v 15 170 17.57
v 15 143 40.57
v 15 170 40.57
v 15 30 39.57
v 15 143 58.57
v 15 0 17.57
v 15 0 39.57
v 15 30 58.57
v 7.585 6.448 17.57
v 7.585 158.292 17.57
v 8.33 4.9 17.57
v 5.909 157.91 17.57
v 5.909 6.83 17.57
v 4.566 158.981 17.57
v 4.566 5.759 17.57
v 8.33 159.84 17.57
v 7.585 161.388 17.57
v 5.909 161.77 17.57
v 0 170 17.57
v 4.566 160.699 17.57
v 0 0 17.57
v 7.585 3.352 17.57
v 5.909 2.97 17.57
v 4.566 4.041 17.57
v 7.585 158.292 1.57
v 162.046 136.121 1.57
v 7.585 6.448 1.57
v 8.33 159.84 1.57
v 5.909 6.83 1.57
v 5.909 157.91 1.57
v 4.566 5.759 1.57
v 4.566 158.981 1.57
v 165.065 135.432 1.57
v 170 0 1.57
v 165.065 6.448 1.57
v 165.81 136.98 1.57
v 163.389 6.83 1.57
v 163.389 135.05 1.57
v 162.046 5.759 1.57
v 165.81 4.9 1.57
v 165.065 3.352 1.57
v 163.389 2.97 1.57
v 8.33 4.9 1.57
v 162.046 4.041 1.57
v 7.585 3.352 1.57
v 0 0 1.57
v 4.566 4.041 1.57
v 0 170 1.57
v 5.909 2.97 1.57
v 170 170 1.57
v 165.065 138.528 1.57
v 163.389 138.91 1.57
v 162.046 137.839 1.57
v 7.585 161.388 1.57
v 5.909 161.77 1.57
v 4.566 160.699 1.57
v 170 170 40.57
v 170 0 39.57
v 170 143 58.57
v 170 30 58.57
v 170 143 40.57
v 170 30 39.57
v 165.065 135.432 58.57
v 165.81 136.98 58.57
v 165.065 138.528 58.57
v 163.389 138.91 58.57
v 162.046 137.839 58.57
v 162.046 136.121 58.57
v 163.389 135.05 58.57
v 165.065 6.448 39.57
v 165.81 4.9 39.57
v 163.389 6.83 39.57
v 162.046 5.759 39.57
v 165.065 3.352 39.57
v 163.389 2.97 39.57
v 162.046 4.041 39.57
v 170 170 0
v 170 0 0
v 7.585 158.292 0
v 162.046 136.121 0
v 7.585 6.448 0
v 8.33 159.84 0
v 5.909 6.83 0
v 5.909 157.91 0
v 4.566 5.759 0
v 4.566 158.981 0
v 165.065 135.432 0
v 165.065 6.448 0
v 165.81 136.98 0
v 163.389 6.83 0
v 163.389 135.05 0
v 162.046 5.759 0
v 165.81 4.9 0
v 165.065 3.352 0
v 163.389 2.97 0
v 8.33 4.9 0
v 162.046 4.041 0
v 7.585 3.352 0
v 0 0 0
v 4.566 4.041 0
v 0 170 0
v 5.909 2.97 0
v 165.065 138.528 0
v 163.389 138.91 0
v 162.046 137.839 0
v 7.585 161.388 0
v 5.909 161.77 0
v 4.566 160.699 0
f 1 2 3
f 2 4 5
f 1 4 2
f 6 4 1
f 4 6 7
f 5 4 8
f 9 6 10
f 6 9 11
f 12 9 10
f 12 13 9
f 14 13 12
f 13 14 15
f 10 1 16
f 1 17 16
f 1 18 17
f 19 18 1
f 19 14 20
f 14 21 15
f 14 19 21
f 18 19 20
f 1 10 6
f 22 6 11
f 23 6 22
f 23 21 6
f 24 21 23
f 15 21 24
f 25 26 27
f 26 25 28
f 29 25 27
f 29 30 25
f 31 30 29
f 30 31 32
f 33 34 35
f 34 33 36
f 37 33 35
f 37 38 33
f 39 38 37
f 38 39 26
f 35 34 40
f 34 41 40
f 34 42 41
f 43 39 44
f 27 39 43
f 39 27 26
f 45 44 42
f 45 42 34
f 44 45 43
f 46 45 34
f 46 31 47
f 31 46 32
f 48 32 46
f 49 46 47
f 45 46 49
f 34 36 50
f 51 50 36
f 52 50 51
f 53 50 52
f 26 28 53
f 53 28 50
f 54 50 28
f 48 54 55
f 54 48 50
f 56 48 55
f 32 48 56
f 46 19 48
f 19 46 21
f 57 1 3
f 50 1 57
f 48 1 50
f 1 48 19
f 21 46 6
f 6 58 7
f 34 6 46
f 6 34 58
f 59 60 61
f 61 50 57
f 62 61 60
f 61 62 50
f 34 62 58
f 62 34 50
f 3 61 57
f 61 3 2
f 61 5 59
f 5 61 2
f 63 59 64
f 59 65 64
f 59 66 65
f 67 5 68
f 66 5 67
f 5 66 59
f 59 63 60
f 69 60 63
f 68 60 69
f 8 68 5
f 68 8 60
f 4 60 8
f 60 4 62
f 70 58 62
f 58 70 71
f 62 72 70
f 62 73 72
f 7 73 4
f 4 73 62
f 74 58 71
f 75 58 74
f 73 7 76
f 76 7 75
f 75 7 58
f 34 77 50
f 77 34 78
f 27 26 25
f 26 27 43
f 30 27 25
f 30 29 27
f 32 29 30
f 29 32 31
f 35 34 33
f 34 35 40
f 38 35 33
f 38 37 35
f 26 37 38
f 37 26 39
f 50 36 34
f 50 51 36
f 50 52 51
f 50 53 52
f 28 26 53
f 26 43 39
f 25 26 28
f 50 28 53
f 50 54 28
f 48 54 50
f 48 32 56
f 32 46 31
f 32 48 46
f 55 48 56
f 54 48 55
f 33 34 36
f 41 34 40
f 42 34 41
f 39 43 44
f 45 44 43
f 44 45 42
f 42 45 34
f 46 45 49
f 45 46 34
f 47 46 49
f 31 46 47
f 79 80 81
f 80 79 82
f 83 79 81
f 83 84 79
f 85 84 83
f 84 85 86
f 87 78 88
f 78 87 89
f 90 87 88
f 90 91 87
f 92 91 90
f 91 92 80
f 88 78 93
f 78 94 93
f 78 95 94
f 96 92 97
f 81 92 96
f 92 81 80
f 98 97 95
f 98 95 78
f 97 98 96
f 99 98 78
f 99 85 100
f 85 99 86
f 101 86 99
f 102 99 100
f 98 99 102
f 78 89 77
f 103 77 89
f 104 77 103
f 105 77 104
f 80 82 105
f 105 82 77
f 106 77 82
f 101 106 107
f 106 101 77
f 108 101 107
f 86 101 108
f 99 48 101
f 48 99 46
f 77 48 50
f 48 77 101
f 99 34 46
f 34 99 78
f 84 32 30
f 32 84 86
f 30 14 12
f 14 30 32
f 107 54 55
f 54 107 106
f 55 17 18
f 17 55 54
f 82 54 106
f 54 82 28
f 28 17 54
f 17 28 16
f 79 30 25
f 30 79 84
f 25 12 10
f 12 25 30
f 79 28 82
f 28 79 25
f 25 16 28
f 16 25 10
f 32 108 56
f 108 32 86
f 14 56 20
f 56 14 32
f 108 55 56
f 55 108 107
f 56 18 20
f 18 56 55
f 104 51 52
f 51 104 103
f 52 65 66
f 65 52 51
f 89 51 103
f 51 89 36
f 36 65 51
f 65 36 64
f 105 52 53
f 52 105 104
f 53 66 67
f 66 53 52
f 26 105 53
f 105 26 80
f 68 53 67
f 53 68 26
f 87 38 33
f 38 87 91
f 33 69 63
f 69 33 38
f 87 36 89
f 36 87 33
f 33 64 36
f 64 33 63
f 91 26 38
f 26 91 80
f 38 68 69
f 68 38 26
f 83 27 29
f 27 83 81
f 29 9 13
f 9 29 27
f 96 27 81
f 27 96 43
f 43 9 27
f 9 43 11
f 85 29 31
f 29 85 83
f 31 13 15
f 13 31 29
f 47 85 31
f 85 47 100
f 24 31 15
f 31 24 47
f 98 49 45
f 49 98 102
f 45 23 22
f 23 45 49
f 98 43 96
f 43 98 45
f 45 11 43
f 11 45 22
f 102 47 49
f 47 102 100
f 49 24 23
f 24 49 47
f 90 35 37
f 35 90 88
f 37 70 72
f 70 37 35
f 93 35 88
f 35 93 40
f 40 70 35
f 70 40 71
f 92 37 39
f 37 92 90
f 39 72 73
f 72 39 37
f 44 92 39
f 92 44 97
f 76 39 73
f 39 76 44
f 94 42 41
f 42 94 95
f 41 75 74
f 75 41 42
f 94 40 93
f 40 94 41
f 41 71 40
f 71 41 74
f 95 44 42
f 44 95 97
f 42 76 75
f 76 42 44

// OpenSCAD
// mini-ITX (and ATX?) spec assumes that for the purposes of component Z-height measurement,
// the motherboard PCB thickness is this (in mm).
s_pcb_thickness = 1.57;

// board X/Y dimensions where the I/O area is at the top.
// used for relative positioning from the top edge below among other things.
s_board_width = 170;
s_board_height = 170;



/*
component height zone layout diagram follows.
information extracted from intel's "Mini-ITX Addendum Version 1.1" document.
this crude diagram is neither to scale (see figures that follow)
nor reproduces any creative aspect of the original technical drawing,
and is in the spirit of interoperability, therefore is believed to be fair use.
*/
/*

// diagram NOT to scale but does represent entire board area.

+--------+------------+
|        |   area D   |
|        +------------+
| area B |   area A
|        +------------+
|        |   area C   |
+--------+------------+

area A takes up everything that B, C and D do not.

*/

// heights of each zone.
s_height_zone_a = 57;
s_height_zone_b = 16;
s_height_zone_c = 38;
s_height_zone_d = 39;

s_component_height_max =
	max(
		max(s_height_zone_a, s_height_zone_b),
		max(s_height_zone_c, s_height_zone_d)
	);


module height_zone_volumes_parametric(
		board_width,
		board_height,
		b_width,
		c_height,
		d_height
	)
{
	// NB: these are just the volumes from the top of the board.
	// it's expected this is pre-elevated to PCB surface via a transform() block.

	cube([b_width, board_height, s_height_zone_b]);

	// all the other zones go from B's right edge to the board's right edge,
	// so they all have a common width.
	b_rhs_width = board_width - b_width;

	// y u no negative distances to go backwards from origin...
	translate( [b_width, board_height - d_height, 0] ) {
		cube([b_rhs_width, d_height, s_height_zone_d]);
	}

	// zone A is between C and D anchored at either edge,
	// so it's Y height is whatever they don't take.
	a_height = board_height - (c_height + d_height);
	assert(a_height > 0);

	translate( [b_width, c_height, 0] ) {
		cube([b_rhs_width, a_height, s_height_zone_a]);
	}

	translate( [b_width, 0, 0] ) {
		cube([b_rhs_width, c_height, s_height_zone_c]);
	}
}

module height_zone_volumes() {
	height_zone_volumes_parametric(
		board_width = s_board_width,
		board_height = s_board_height,
		b_width = 15,
		c_height = 30,
		d_height = 27
	);
}

module mitx_base_volumes() {
	cube([s_board_width, s_board_height, s_pcb_thickness]);

	// component heights based off top of PCB.
	translate([0, 0, s_pcb_thickness]) {
		height_zone_volumes();
	}
}



// as far as the module is allowed to reach upwards.
// used for inserting alignment screw hole columns through the mock volume,
// though if one were going to do screw access keep-out zones they'd be wider above the PCB.
s_board_max_z_height = s_pcb_thickness + s_component_height_max;

// spec-mandated screw hole diameter.
s_mount_hole_diameter = 3.96;

module mitx_screw_column(pos) {
	translate([pos.x, pos.y, 0.]) {
		cylinder(h = s_board_max_z_height + 0.001, d = s_mount_hole_diameter);
	}
}



// mount hole locations are given from top of board in spec.
// naming is based on the spec too, using the subset of ATX holes that mITX uses.

function toppos(x, y) = [x, s_board_height - y];


// cumulative distances of the holes from the board edges.
// (Y is again measured from the top edge (i.e. the I/O edge in the spec schematics).)
s_mount_hole_align_x1 = 6.35;
s_mount_hole_align_x2 = s_mount_hole_align_x1 + 157.48;

s_mount_hole_align_y1 = 10.16;
s_mount_hole_align_y2 = s_mount_hole_align_y1 + 22.86;

// yes, this one is given relative to the first Y position (mounting hole C)
s_mount_hole_align_y3 = s_mount_hole_align_y1 + 154.94;


s_mount_hole_c = toppos(s_mount_hole_align_x1, s_mount_hole_align_y1);
s_mount_hole_f = toppos(s_mount_hole_align_x2, s_mount_hole_align_y2);
s_mount_hole_h = toppos(s_mount_hole_align_x1, s_mount_hole_align_y3);
s_mount_hole_j = toppos(s_mount_hole_align_x2, s_mount_hole_align_y3);

module mitx_base_cutout_volumes() {
	mitx_screw_column(s_mount_hole_c);
	mitx_screw_column(s_mount_hole_f);
	mitx_screw_column(s_mount_hole_h);
	mitx_screw_column(s_mount_hole_j);
}



module mitx_base() {
	difference() {
		mitx_base_volumes();
		mitx_base_cutout_volumes();
	}
}

mitx_base();
